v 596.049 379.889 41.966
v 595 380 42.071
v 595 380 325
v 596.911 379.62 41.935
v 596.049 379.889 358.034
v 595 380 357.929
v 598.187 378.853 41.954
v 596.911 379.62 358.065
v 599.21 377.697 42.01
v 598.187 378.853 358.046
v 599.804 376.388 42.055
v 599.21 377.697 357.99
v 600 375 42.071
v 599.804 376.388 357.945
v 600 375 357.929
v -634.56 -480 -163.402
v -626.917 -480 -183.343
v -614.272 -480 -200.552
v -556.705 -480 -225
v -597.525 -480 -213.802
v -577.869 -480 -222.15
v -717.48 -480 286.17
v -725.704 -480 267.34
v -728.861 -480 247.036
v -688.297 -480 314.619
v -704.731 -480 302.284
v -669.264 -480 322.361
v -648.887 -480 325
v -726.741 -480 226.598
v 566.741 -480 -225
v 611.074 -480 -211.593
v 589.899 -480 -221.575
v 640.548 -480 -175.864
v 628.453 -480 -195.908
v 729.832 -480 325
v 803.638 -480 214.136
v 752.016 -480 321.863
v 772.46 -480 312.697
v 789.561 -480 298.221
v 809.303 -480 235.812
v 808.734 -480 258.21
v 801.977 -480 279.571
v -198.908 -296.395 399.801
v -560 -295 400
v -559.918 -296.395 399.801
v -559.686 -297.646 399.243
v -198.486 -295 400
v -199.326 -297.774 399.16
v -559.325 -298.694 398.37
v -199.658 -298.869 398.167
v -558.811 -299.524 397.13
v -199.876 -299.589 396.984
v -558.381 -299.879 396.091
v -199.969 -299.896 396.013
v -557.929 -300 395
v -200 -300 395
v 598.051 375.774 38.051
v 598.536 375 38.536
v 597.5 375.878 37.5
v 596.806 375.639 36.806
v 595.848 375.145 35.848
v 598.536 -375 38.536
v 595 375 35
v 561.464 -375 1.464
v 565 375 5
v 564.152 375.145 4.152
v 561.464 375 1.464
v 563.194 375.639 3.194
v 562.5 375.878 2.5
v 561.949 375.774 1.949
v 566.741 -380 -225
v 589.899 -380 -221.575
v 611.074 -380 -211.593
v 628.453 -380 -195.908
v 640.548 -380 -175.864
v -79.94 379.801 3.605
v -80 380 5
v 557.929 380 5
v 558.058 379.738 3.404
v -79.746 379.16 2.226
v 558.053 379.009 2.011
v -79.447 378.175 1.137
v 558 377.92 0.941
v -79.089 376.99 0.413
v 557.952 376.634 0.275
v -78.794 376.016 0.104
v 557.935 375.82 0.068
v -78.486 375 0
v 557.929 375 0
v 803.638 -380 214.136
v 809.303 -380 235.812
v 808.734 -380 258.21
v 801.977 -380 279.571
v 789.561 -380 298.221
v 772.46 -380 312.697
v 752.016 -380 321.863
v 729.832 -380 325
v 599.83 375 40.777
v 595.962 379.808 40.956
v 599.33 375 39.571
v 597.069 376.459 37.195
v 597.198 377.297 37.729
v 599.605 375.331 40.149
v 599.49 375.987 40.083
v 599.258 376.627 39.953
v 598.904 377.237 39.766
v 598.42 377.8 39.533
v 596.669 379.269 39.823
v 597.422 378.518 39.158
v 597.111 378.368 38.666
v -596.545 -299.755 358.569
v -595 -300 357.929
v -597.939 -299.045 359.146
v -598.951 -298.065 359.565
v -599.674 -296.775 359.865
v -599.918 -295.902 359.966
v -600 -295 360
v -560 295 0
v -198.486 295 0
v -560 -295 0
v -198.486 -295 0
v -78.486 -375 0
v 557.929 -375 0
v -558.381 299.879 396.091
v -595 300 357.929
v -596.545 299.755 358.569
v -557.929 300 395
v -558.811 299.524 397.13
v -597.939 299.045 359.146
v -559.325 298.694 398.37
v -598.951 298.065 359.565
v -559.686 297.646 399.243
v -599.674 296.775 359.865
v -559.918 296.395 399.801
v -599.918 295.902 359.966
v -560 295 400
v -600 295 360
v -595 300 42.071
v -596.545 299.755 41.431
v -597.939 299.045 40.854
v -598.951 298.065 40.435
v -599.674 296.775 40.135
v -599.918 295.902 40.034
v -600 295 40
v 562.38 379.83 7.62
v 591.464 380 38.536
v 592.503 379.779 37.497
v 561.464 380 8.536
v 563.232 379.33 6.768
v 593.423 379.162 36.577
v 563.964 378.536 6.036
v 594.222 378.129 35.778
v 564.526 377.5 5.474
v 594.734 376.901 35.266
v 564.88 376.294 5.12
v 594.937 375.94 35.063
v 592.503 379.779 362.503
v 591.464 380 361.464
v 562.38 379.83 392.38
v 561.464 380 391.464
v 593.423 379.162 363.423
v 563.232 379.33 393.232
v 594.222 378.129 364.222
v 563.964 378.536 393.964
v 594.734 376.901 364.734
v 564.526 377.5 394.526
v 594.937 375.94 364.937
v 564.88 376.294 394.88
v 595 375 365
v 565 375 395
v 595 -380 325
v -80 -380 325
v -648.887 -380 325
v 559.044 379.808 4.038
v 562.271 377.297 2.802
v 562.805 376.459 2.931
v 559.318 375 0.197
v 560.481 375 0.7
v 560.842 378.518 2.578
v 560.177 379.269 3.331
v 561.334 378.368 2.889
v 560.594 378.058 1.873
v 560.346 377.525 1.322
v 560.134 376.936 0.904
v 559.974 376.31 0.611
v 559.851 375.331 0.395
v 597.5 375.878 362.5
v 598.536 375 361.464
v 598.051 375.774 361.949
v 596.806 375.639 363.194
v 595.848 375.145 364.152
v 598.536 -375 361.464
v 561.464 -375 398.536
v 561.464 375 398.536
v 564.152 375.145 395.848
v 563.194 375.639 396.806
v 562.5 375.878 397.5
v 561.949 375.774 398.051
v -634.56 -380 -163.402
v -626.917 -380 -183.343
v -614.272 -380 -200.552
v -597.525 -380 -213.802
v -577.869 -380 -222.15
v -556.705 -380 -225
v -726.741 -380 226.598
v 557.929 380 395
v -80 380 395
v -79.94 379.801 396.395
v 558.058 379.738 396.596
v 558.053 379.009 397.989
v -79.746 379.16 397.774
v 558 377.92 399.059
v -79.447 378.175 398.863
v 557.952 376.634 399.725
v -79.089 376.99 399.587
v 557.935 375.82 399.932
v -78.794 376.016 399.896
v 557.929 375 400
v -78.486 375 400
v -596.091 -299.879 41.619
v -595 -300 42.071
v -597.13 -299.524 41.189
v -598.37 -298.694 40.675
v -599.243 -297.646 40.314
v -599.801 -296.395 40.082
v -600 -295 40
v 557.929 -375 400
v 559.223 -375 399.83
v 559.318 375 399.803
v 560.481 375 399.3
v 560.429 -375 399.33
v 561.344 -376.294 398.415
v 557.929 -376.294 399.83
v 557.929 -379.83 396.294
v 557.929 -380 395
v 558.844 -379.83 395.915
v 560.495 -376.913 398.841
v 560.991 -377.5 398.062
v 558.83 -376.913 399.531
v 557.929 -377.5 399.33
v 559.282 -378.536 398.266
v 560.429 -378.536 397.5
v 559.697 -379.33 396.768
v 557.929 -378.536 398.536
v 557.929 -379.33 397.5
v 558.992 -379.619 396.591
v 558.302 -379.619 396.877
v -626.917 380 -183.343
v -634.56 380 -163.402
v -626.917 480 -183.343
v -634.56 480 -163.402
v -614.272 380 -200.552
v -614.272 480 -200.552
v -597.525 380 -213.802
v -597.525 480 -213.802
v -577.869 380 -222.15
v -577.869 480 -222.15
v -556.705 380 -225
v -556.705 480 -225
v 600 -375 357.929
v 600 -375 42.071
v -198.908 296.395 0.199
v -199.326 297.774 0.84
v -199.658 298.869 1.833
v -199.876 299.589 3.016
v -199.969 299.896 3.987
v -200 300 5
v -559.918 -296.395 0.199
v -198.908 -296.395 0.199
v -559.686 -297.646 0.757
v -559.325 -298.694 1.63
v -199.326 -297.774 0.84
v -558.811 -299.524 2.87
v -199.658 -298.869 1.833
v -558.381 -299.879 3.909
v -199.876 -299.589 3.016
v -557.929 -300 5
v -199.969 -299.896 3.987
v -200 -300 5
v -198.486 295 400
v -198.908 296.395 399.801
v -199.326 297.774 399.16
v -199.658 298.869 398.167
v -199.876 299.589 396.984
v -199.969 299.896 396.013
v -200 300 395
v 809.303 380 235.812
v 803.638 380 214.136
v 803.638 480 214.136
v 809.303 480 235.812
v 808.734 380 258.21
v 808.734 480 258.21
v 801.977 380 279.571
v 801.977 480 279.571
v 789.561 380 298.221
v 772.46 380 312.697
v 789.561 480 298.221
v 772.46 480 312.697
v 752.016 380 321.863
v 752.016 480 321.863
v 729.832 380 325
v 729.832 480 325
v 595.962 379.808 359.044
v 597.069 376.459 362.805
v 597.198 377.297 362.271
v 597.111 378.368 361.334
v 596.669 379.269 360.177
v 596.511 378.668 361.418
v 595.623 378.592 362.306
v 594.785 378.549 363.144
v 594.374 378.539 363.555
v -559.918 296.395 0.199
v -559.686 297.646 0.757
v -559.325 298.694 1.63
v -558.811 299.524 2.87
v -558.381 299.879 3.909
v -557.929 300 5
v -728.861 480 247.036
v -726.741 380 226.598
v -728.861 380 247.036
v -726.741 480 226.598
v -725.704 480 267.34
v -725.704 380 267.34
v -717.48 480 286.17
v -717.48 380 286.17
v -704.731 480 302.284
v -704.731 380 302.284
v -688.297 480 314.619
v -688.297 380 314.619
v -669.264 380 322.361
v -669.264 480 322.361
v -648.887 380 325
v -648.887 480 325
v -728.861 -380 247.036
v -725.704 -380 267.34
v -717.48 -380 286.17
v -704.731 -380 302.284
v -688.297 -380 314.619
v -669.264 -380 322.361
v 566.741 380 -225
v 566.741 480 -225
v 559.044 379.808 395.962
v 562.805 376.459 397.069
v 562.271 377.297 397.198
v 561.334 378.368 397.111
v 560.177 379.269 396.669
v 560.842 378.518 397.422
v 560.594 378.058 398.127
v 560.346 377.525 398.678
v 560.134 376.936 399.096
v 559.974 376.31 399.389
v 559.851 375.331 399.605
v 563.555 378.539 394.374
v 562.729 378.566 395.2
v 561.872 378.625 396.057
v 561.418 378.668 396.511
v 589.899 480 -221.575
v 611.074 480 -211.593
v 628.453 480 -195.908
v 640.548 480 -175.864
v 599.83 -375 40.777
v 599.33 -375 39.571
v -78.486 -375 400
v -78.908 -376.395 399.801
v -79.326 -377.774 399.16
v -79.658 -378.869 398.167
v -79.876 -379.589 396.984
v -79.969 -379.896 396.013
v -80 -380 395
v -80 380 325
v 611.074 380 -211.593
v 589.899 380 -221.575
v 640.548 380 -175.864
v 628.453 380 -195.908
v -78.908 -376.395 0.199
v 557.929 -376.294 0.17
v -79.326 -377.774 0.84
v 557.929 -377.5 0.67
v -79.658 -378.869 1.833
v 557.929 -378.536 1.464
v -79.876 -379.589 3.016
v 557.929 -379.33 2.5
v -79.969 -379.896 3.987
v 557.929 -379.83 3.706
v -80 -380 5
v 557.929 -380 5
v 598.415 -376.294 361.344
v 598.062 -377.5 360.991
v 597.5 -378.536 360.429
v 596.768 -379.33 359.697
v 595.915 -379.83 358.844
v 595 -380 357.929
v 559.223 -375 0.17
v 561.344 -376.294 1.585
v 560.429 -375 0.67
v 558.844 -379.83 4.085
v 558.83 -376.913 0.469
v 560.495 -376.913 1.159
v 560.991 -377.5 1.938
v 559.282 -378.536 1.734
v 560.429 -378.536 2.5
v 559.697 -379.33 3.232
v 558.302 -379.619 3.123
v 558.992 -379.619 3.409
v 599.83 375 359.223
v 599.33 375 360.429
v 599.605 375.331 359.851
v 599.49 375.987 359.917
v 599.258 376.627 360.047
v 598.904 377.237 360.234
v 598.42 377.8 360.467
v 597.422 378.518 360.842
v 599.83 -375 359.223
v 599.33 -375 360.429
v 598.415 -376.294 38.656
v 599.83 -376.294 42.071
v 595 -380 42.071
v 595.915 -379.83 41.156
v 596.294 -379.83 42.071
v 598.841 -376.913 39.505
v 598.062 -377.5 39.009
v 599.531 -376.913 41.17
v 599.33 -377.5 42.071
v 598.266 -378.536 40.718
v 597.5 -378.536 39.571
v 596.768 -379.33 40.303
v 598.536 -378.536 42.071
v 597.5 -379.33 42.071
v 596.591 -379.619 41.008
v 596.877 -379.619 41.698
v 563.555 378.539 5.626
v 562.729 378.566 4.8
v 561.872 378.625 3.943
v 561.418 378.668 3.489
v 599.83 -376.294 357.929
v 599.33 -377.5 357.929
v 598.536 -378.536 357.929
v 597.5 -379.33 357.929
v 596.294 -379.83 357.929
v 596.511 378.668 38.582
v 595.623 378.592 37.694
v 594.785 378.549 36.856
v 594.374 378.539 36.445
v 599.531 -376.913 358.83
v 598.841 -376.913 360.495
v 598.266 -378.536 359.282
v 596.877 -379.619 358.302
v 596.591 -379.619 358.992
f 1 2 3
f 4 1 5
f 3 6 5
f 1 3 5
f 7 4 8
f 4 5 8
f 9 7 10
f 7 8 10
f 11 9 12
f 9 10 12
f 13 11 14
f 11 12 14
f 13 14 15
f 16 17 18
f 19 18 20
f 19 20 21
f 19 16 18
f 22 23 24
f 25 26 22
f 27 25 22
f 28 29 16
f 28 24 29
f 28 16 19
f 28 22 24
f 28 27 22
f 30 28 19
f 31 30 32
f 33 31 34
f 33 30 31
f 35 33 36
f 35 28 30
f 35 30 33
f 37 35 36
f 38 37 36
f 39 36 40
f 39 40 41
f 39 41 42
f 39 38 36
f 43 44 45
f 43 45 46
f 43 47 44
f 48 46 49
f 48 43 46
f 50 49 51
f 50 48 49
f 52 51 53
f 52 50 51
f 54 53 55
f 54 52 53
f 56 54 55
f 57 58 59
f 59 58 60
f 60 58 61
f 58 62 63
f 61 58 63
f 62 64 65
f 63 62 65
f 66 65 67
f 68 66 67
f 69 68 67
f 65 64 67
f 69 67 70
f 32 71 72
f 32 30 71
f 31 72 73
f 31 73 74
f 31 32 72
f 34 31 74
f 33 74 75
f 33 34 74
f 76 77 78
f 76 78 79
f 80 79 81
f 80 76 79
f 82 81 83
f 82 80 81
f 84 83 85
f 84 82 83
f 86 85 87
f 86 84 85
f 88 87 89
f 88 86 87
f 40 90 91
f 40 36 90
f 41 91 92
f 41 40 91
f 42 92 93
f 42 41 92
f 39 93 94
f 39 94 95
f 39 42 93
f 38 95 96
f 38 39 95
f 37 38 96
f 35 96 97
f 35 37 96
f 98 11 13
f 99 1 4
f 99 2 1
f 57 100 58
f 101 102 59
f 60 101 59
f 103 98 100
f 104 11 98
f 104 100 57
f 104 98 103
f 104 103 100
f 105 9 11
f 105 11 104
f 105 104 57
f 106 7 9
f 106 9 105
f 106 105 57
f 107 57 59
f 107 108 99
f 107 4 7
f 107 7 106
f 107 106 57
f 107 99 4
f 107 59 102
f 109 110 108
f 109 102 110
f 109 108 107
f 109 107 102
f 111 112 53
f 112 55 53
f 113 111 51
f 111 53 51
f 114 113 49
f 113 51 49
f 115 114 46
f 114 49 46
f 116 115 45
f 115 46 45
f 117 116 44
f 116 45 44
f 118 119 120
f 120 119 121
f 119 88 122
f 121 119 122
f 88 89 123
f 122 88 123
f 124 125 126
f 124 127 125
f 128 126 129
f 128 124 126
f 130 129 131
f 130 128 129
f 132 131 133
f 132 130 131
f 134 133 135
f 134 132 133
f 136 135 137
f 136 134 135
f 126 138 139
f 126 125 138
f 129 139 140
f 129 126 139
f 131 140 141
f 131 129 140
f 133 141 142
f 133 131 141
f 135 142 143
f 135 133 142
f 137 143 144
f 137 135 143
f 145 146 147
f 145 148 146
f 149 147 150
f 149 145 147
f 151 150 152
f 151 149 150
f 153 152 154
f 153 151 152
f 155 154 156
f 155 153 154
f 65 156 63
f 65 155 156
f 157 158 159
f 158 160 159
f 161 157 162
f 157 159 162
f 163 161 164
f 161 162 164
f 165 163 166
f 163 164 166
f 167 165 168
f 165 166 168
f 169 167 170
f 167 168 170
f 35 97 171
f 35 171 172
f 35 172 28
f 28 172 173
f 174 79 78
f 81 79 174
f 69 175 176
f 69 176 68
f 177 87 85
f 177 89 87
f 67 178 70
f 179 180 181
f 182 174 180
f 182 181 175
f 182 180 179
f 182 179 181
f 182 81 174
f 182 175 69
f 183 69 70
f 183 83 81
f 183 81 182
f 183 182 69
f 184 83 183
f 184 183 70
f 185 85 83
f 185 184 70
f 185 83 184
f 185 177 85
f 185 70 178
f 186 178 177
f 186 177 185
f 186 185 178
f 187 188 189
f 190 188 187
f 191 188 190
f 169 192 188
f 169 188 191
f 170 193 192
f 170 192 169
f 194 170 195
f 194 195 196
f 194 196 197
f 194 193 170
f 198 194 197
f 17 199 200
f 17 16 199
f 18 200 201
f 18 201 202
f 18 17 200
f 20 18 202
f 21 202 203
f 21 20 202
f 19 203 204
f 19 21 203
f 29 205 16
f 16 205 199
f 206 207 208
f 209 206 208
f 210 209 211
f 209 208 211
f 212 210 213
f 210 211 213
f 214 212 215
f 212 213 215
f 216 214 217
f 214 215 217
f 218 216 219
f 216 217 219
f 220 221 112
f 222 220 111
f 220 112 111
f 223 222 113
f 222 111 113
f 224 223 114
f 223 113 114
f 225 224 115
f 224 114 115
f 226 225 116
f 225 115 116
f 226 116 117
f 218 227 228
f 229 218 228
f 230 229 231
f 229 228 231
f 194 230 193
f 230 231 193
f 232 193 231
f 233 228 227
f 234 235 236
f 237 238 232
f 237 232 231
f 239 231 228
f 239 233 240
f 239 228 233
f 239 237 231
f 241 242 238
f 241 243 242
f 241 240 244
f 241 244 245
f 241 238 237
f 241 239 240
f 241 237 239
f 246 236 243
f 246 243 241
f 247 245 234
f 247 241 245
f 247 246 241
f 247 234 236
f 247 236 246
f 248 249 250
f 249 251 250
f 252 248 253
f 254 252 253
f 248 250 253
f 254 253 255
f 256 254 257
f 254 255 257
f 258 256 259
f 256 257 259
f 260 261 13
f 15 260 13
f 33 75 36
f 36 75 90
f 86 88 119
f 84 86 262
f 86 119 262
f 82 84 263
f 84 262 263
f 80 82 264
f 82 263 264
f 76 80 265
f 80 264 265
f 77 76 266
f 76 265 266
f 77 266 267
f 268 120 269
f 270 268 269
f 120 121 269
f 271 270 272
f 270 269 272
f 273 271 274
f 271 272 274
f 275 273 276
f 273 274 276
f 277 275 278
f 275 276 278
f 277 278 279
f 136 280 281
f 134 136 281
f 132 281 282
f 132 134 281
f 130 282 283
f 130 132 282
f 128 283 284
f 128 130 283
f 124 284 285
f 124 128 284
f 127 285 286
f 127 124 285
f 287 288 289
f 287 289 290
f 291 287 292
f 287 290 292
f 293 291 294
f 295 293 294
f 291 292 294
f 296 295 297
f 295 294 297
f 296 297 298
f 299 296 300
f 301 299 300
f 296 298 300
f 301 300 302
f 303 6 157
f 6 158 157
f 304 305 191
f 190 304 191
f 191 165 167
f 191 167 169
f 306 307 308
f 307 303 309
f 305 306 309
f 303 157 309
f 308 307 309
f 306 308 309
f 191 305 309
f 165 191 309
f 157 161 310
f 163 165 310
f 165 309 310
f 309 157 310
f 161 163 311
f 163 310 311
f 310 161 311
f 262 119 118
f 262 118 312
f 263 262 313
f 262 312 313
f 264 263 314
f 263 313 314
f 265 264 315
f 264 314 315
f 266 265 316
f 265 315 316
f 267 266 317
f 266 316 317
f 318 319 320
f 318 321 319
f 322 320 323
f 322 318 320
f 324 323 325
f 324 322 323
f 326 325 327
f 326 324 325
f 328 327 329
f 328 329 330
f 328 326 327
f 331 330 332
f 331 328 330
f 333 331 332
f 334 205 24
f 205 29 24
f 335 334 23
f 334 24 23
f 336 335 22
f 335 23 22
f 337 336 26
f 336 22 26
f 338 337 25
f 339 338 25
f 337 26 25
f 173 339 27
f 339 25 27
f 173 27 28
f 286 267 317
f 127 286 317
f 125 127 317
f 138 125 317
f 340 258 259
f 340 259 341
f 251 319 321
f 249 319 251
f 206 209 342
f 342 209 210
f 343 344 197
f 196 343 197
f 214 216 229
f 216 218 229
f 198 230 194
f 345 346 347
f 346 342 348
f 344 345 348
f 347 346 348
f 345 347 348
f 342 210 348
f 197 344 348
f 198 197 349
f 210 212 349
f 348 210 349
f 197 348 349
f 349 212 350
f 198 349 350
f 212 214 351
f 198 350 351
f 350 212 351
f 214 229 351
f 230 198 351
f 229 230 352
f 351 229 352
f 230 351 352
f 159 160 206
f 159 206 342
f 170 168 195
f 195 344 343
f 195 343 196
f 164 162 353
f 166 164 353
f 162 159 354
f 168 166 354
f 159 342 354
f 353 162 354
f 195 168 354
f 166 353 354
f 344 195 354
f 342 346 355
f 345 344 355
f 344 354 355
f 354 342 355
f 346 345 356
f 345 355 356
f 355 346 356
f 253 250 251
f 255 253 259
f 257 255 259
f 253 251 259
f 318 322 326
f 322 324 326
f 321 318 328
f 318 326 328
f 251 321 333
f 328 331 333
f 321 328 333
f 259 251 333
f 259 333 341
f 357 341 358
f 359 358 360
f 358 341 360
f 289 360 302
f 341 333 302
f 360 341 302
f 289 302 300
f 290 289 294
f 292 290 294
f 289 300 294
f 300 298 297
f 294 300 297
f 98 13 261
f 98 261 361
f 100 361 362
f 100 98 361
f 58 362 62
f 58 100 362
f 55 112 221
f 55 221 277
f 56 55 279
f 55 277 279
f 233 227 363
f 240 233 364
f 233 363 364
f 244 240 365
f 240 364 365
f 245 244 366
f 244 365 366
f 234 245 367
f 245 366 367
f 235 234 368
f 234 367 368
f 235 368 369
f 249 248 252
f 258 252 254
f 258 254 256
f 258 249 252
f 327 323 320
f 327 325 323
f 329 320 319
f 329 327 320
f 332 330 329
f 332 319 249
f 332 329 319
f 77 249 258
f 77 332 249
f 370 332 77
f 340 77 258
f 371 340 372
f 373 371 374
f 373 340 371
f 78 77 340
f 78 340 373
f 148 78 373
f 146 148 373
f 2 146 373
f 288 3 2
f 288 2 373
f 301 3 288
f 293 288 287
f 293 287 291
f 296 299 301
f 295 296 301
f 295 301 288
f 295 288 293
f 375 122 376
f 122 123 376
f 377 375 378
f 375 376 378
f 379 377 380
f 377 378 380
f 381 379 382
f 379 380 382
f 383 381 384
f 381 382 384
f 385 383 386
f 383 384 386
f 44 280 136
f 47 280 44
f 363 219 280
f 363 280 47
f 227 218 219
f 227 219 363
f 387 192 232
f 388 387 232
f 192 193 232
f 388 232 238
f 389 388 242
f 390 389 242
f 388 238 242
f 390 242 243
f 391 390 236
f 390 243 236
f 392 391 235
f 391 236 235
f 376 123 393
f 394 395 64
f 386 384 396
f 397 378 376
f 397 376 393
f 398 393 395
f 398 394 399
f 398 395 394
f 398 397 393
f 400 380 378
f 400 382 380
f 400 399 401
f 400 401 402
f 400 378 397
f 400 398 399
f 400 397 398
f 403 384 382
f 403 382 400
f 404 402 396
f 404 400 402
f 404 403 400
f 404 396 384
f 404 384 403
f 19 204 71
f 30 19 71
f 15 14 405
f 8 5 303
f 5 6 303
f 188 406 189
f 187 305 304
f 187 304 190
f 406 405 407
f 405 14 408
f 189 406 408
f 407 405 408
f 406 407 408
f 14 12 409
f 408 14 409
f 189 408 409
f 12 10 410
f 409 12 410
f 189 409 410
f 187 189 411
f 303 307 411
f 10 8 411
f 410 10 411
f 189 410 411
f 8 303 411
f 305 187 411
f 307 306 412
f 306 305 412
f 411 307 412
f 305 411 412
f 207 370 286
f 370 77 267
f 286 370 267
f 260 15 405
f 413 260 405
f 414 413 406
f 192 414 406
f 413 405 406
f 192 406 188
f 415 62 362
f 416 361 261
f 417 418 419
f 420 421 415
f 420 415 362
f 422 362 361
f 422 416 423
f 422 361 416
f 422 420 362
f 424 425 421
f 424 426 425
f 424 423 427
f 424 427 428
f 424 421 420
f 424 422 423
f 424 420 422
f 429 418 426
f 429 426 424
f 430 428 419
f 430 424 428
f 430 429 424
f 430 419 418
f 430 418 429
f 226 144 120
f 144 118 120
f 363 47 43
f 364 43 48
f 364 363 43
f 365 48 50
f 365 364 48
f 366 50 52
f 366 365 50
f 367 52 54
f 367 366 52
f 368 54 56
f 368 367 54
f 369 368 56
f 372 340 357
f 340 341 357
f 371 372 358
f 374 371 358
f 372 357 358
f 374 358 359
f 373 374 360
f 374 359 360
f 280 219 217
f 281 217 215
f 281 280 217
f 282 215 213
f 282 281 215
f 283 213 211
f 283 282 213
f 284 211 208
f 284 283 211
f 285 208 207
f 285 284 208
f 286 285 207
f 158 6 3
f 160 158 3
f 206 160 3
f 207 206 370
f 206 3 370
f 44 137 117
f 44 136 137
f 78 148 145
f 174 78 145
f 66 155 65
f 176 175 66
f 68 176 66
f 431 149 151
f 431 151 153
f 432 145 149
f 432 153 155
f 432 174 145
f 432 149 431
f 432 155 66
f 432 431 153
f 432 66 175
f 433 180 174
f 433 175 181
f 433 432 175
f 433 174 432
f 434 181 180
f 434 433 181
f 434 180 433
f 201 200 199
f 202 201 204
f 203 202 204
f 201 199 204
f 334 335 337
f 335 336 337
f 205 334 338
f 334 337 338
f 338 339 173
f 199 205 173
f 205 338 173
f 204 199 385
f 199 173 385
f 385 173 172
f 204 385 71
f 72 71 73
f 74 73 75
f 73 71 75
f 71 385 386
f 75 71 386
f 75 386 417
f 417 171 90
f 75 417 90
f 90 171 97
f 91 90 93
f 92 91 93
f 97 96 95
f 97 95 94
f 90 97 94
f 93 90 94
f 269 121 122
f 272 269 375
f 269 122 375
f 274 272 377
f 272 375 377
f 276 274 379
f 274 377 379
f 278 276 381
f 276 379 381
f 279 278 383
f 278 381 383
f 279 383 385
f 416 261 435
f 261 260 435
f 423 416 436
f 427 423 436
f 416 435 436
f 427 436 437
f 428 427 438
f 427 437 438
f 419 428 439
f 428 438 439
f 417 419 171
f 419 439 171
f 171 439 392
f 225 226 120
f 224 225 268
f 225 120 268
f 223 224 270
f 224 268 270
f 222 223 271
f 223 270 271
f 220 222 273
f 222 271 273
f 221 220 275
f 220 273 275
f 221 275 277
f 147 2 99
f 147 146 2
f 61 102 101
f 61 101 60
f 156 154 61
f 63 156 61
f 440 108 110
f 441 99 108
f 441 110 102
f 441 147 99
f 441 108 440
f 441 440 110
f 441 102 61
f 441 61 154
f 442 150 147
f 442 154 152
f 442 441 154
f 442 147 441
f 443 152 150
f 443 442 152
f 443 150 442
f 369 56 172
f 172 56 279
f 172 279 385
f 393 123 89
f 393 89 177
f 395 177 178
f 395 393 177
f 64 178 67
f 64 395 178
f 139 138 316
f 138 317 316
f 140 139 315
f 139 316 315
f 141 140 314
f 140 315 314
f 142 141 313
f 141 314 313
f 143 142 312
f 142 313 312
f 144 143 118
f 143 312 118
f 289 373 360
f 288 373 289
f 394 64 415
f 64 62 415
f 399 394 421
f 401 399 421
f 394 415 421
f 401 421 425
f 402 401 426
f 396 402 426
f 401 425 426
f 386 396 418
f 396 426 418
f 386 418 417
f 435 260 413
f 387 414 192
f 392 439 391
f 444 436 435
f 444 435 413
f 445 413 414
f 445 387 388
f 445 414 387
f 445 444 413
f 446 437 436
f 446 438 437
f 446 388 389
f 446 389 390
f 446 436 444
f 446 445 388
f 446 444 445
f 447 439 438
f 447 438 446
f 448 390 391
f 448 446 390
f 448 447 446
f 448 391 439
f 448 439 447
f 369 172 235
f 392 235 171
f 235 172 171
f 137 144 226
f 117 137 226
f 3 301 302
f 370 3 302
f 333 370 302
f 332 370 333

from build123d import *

# Parameters (mm, degrees)
EXTRUDE001_DEPTH                     = 100
EXTRUDE001_ONTO_SKETCH001_ROLL_ANGLE = 90
FILLET003_R                          = 80
FILLET003_PLACEMENT_ANGLE            = 90
EXTRUDE_DEPTH                        = 400
CHAMFER_SIZE                         = 40
FILLET_R                             = 5
FILLET001_R                          = 5
FILLET002_R                          = 5
FUSION001_PLACEMENT_ANGLE            = -90


with BuildPart() as pas001:
    # Sketch001 as drawn → Extrude001 (new)
    with BuildSketch(Plane.XY):
        Polygon((-750, 325), (-620, -225), (620, -225), (850, 325), align=None)
    extrude(amount=-EXTRUDE001_DEPTH)


with BuildPart() as pas001_1:
    # Extrude001 onto Sketch001 roll: moved
    add(pas001.part.rotate(Axis((0, 0, 0), (1, 0, 0)), EXTRUDE001_ONTO_SKETCH001_ROLL_ANGLE))


with BuildPart() as pas001_2:
    # Extrude001 onto Sketch001 placement: moved
    add(pas001_1.part)

    # Fillet003
    fillet003_edges = [pas001_2.edges().sort_by_distance(p)[0] for p in [
        (-750, 50, 325),
        (-620, 50, -225),
        (620, 50, -225),
        (850, 50, 325),
    ]]
    fillet(fillet003_edges, radius=FILLET003_R)


with BuildPart() as pas001_3:
    # Fillet003 placement: moved
    add(pas001_2.part.moved(Location((-380, 0, 0))).rotate(Axis((-380, 0, 0), (0, 0, 1)), FILLET003_PLACEMENT_ANGLE))


with BuildPart() as fusion:
    # Sketch → Extrude (new body)
    with BuildSketch(Plane.XY):
        Polygon((-380, 600), (-380, -80), (-300, -200), (-300, -600), (300, -600), (300, -200), (380, -80), (380, 600), align=None)
    extrude(amount=EXTRUDE_DEPTH)

    # Chamfer
    chamfer_edges = [fusion.edges().sort_by_distance(p)[0] for p in [
        (0, -600, 0),
        (0, -600, 400),
        (0, 600, 0),
        (0, 600, 400),
    ]]
    chamfer(chamfer_edges, length=CHAMFER_SIZE)

    # Fillet
    fillet_edges = [fusion.edges().sort_by_distance(p)[0] for p in [
        (-380, 600, 200),
        (-380, 240, 0),
        (-380, 240, 400),
        (-340, -140, 0),
        (-300, -380, 0),
        (-340, -140, 400),
        (-300, -380, 400),
        (-300, -600, 200),
        (-300, -580, 20),
        (-300, -580, 380),
    ]]
    fillet(fillet_edges, radius=FILLET_R)

    # Fillet001
    fillet001_edges = [fusion.edges().sort_by_distance(p)[0] for p in [
        (-380, 580, 20),
        (-380, 580, 380),
    ]]
    fillet(fillet001_edges, radius=FILLET001_R)

    # Fillet002
    fillet002_edges = [fusion.edges().sort_by_distance(p)[0] for p in [
        (380, 600, 200),
        (380, 580, 20),
        (380, 580, 380),
        (380, 238.964466, 0),
        (340, -140, 0),
        (300, -380, 0),
        (380, 238.964466, 400),
        (340, -140, 400),
        (300, -380, 400),
        (300, -580, 20),
        (300, -600, 200),
        (300, -580, 380),
    ]]
    fillet(fillet002_edges, radius=FILLET002_R)

    # Fusion: union Pas001
    add(pas001_3.part)


with BuildPart() as robotruda:
    # Part__Mirroring: instance of Pas001
    add(pas001_3.part.mirror(Plane(origin=(0, 0, 0), x_dir=(0, -1, 0), z_dir=(1, 0, 0))))

    # Fusion001: union Fusion
    add(fusion.part)


with BuildPart() as robotruda_1:
    # Fusion001 placement: moved
    add(robotruda.part.rotate(Axis((0, 0, 0), (0, 0, 1)), FUSION001_PLACEMENT_ANGLE))


solid = robotruda_1.part
